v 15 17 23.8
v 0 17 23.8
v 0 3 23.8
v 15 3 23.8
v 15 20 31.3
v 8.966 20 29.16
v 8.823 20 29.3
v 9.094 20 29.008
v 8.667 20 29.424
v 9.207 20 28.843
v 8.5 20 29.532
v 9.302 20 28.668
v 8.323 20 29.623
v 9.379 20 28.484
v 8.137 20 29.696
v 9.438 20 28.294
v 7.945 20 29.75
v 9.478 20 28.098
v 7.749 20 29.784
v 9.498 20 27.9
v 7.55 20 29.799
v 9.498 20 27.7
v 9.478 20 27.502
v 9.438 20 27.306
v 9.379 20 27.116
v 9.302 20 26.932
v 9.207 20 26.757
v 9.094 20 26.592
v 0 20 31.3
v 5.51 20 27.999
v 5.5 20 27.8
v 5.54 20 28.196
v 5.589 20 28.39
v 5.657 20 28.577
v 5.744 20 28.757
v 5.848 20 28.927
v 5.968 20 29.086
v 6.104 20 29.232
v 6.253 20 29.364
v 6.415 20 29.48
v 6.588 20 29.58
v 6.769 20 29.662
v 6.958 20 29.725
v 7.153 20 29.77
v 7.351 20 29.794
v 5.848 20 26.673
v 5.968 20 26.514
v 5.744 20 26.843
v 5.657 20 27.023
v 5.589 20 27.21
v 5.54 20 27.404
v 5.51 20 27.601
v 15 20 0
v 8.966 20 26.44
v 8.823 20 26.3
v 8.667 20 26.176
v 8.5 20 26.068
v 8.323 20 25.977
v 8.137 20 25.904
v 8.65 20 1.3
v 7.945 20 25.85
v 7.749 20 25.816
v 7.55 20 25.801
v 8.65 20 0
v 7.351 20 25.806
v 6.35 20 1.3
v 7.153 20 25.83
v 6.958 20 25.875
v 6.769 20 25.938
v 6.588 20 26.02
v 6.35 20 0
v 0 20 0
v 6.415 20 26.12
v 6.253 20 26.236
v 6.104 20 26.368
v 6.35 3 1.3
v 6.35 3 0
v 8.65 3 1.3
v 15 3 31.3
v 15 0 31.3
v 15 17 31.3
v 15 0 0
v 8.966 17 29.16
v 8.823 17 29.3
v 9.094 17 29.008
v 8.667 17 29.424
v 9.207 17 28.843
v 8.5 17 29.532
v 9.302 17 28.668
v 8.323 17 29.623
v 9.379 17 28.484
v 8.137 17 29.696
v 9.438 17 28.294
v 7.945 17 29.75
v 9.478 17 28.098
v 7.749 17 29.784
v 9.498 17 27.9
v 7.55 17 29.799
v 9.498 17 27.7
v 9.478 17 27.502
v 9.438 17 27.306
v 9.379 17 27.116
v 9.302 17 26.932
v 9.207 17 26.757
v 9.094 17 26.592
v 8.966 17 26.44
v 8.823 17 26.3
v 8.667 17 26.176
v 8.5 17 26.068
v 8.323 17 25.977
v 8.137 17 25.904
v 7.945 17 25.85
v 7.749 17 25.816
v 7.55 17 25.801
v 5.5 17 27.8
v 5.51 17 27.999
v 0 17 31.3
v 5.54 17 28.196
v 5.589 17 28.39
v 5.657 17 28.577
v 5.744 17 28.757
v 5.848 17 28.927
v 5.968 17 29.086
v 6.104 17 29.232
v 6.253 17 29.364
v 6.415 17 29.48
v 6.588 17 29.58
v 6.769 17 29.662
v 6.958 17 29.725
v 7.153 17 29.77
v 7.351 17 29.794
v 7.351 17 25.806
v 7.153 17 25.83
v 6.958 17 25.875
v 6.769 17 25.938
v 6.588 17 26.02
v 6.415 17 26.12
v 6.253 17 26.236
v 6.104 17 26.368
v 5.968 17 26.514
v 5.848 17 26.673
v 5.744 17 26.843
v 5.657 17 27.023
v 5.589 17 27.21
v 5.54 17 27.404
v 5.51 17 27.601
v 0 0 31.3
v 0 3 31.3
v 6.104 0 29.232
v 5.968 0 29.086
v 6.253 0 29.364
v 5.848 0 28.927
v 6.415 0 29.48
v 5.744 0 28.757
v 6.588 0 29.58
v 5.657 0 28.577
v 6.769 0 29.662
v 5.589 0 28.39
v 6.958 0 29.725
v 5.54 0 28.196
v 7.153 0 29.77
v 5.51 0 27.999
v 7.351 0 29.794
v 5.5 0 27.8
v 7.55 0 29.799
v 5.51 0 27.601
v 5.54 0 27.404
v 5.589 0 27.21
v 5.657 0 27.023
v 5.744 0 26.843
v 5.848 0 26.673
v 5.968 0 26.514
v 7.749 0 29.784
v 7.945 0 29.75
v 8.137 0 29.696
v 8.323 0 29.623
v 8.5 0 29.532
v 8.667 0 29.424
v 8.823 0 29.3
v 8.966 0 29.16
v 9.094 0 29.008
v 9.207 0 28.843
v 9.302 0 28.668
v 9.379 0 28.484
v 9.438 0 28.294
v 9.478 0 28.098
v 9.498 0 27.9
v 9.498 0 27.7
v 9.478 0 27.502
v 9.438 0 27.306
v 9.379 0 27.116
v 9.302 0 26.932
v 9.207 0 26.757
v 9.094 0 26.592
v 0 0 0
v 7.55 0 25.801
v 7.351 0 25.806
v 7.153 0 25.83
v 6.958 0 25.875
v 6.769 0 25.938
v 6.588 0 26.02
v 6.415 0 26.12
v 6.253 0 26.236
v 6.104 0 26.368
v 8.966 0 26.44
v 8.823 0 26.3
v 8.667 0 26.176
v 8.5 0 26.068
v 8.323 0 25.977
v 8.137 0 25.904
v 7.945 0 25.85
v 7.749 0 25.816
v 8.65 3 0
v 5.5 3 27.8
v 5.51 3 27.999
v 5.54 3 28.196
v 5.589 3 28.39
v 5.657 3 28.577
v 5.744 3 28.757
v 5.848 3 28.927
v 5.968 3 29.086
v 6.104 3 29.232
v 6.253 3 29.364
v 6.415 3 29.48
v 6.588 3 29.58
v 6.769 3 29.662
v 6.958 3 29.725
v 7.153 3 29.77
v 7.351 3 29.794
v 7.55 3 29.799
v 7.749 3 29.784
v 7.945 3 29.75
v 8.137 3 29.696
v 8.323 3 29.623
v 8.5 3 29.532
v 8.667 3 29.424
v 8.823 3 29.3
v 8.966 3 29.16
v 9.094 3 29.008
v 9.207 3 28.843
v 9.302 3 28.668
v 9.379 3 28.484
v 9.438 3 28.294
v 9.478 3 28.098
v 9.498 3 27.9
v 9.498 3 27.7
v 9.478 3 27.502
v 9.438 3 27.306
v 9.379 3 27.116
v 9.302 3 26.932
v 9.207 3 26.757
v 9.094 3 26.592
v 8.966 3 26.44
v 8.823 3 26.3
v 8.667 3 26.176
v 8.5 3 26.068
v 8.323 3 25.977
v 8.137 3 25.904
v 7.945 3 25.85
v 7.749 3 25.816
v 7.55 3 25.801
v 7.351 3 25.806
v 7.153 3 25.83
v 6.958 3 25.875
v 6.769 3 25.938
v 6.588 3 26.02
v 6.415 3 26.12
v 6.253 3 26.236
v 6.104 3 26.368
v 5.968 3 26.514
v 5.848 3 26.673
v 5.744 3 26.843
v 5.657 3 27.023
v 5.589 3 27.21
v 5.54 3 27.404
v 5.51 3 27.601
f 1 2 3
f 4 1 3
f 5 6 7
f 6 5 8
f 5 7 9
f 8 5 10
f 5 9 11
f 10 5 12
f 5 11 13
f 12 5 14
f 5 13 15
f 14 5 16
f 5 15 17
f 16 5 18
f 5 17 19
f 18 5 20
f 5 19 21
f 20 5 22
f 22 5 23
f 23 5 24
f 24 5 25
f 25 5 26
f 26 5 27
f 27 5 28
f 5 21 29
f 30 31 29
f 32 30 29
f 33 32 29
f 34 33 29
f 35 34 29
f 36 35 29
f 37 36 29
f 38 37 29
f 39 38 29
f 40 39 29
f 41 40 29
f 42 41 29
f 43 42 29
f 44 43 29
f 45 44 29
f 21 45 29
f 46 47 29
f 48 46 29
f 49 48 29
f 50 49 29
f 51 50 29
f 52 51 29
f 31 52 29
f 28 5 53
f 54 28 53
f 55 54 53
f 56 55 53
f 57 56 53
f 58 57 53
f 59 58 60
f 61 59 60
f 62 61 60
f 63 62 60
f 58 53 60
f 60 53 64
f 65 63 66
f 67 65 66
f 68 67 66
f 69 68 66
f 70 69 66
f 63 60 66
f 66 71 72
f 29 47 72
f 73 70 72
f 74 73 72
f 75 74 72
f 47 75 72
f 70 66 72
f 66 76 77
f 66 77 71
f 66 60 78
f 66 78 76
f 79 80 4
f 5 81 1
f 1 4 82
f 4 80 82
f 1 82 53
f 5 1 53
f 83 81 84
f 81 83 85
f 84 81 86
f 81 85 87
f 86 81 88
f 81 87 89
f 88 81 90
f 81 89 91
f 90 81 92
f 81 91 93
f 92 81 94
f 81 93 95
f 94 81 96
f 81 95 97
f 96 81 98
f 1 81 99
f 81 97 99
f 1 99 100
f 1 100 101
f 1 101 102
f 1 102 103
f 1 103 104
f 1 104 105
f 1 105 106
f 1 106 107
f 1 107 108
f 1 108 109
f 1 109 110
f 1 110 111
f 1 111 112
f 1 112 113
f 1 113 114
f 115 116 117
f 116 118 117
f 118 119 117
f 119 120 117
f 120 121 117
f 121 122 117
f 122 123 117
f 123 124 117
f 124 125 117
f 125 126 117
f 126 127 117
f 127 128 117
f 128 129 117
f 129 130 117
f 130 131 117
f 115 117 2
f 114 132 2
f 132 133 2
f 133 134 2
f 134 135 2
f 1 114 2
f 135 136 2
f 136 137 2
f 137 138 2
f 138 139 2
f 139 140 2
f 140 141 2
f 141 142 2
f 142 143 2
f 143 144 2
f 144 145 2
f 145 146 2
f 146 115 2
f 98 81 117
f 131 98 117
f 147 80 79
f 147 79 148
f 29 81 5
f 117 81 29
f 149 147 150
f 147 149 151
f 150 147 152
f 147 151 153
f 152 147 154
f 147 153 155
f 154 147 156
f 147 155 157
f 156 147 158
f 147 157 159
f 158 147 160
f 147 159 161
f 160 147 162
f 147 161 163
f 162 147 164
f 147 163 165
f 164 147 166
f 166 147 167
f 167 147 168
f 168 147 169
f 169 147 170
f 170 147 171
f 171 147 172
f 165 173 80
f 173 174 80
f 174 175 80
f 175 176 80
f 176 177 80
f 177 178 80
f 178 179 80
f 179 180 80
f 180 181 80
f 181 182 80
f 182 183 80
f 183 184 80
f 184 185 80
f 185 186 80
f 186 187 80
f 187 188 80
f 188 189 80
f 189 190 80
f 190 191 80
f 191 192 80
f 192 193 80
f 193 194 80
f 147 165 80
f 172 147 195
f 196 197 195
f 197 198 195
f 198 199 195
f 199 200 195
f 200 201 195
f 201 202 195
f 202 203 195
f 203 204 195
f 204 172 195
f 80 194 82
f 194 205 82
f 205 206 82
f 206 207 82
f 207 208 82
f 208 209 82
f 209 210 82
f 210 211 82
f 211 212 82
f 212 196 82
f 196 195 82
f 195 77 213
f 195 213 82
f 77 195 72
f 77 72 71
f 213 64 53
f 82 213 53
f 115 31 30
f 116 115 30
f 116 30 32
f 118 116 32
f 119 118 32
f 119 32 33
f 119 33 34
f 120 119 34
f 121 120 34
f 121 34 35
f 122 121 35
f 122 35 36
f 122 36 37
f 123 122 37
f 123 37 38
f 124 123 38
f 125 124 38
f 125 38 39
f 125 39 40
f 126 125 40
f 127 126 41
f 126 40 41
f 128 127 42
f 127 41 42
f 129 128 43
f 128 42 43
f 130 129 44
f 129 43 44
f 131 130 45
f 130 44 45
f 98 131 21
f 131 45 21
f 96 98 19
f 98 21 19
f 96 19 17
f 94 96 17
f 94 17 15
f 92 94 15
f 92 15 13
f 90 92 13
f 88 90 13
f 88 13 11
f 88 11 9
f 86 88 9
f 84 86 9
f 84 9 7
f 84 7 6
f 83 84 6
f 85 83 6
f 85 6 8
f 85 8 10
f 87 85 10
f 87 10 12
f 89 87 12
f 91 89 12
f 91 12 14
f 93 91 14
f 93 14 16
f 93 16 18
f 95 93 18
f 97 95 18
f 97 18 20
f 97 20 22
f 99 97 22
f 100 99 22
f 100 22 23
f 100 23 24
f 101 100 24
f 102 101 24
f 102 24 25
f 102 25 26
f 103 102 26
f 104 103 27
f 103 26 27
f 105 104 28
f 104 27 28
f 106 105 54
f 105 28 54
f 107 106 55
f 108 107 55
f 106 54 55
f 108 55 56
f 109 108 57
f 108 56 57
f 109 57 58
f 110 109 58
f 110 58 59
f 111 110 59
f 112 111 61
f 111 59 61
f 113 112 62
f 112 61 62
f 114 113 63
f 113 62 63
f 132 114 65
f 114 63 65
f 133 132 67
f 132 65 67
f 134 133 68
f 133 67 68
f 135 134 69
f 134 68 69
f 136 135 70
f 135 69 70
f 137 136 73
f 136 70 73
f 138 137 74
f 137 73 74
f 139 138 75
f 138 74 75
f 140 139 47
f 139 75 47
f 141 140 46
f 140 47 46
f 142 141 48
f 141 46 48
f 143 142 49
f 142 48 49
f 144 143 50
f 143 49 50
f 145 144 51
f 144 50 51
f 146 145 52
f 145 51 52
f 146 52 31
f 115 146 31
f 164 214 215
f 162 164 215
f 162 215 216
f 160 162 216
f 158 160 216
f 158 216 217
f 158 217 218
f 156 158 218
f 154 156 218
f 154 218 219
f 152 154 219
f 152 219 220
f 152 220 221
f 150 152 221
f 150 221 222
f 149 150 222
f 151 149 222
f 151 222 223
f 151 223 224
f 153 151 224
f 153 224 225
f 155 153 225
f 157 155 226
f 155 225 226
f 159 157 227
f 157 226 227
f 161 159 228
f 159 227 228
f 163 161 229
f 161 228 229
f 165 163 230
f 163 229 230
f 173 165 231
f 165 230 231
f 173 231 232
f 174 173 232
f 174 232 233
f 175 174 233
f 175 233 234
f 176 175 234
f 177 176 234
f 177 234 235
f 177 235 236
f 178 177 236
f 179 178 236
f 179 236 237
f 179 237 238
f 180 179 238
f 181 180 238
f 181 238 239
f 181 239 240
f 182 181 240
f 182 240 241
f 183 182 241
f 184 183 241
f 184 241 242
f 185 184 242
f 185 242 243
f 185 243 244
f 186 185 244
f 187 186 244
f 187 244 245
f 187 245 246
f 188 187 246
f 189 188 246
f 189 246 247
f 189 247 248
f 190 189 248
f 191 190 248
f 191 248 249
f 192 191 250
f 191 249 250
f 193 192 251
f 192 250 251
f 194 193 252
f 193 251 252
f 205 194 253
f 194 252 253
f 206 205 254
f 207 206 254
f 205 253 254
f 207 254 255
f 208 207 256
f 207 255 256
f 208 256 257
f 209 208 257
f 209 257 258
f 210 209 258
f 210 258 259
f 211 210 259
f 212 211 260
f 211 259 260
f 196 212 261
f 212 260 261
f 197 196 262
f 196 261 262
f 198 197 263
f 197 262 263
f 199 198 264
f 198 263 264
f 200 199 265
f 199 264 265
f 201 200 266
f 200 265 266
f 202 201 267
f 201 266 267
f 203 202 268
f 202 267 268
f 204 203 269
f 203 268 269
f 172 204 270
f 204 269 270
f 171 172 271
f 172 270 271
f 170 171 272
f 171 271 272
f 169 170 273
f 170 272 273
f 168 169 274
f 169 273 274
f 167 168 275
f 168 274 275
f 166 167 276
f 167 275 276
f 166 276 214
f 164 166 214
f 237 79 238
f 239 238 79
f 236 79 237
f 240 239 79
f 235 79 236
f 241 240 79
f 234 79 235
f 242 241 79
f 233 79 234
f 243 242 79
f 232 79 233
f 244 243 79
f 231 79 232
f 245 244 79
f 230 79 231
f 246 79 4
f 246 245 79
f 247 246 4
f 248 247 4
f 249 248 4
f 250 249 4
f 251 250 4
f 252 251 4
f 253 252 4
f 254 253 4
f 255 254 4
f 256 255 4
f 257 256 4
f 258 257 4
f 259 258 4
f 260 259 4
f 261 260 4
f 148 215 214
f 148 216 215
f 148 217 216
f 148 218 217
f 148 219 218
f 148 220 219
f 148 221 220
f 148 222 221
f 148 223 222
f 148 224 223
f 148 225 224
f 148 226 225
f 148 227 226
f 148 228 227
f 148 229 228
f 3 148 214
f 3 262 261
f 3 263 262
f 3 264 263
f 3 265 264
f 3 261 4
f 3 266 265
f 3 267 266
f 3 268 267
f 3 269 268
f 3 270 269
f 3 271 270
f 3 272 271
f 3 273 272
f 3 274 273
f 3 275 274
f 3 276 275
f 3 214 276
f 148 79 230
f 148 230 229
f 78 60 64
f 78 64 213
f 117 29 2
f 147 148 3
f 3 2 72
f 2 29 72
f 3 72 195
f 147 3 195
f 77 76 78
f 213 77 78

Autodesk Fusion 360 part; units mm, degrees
sketch "Sketch1" plane through (0, 0, 0) normal (0, 0, 1) x (1, 0, 0)
  line L0 (0, 0) -> (15, 0)
  line L1 (15, 0) -> (15, 20)
  line L2 (15, 20) -> (0, 20)
  line L3 (0, 20) -> (0, 0)
  dimension "d1" = 15
  dimension "d2" = 20
extrude "Extrude1" add sketch "Sketch1" along normal blind 1.3
sketch "Sketch3" plane through (0, 0, 1.3) normal (0, 0, 1) x (-1, 0, 0)
  line L0 (0, -20) -> (0, 0)
  line L1 (0, 0) -> (-15, 0)
  line L2 (-15, 0) -> (-15, -20)
  line L3 (-15, -20) -> (0, -20)
  line L4 (-8.65, -4.5) -> (-8.65, -20)
  line L5 (-8.65, -20) -> (-7.5, -20)
  line L6 (-6.35, -4.5) -> (-6.35, -20)
  line L7 (-6.35, -20) -> (-7.5, -20)
  line L8 (-6.35, -3) -> (-8.65, -3)
  line L9 (-6.35, -4.5) -> (-6.35, -3)
  line L10 (-8.65, -4.5) -> (-8.65, -3)
  dimension "d14" = 3
extrude "Extrude2" cut sketch "Sketch3" against normal blind 6 contours L3 L4 L5 L6 L7 L8 L9 L10
sketch "Sketch4" plane through (0, 0, 1.3) normal (0, 0, 1) x (-1, 0, 0)
  line L0 (-6.35, -3) -> (-6.35, -20)
  line L1 (-6.35, -20) -> (0, -20)
  line L2 (0, -20) -> (0, 0)
  line L3 (0, 0) -> (-15, 0)
  line L4 (-15, 0) -> (-15, -20)
  line L5 (-15, -20) -> (-8.65, -20)
  line L6 (-8.65, -20) -> (-8.65, -3)
  line L7 (-8.65, -3) -> (-6.35, -3)
  line L8 (0, 0) -> (-15, 0)
  line L9 (-15, 0) -> (-15, -20)
  line L10 (-15, -20) -> (0, -20)
  line L11 (0, -20) -> (0, 0)
extrude "Extrude3" add sketch "Sketch4" along normal blind 30
sketch "Sketch5" plane through (0, 0, 0) normal (-1, 0, 0) x (0, -1, 0)
  line L0 (-20, 0) -> (0, 0)
  line L1 (0, 0) -> (0, 31.3)
  line L2 (0, 31.3) -> (-20, 31.3)
  line L3 (-20, 31.3) -> (-20, 0)
  line L4 (-10, 31.3) -> (-17, 31.3)
  line L5 (-10, 31.3) -> (-3, 31.3)
  line L6 (-17, 31.3) -> (-17, 23.8)
  line L7 (-3, 31.3) -> (-3, 23.8)
  line L8 (-17, 23.8) -> (-3, 23.8)
  dimension "d19" = 7
  dimension "d20" = 7
  dimension "d21" = 7.5
  dimension "d22" = 7.5
extrude "Extrude4" cut sketch "Sketch5" against normal blind 24 contours L2 L4 L5 L6 L7 L8
sketch "Sketch6" plane through (0, 20, 0) normal (0, 1, 0) x (-1, 0, 0)
  line L0 (-6.35, 1.3) -> (-6.35, 0)
  line L1 (-6.35, 0) -> (0, 0)
  line L2 (0, 0) -> (0, 31.3)
  line L3 (0, 31.3) -> (-15, 31.3)
  line L4 (-15, 31.3) -> (-15, 0)
  line L5 (-15, 0) -> (-8.65, 0)
  line L6 (-8.65, 0) -> (-8.65, 1.3)
  line L7 (-8.65, 1.3) -> (-6.35, 1.3)
  circle A0 centre (-7.5, 27.8) radius 2
  dimension "d26" = 4
extrude "Extrude5" cut sketch "Sketch6" against normal blind 22 contours A0
